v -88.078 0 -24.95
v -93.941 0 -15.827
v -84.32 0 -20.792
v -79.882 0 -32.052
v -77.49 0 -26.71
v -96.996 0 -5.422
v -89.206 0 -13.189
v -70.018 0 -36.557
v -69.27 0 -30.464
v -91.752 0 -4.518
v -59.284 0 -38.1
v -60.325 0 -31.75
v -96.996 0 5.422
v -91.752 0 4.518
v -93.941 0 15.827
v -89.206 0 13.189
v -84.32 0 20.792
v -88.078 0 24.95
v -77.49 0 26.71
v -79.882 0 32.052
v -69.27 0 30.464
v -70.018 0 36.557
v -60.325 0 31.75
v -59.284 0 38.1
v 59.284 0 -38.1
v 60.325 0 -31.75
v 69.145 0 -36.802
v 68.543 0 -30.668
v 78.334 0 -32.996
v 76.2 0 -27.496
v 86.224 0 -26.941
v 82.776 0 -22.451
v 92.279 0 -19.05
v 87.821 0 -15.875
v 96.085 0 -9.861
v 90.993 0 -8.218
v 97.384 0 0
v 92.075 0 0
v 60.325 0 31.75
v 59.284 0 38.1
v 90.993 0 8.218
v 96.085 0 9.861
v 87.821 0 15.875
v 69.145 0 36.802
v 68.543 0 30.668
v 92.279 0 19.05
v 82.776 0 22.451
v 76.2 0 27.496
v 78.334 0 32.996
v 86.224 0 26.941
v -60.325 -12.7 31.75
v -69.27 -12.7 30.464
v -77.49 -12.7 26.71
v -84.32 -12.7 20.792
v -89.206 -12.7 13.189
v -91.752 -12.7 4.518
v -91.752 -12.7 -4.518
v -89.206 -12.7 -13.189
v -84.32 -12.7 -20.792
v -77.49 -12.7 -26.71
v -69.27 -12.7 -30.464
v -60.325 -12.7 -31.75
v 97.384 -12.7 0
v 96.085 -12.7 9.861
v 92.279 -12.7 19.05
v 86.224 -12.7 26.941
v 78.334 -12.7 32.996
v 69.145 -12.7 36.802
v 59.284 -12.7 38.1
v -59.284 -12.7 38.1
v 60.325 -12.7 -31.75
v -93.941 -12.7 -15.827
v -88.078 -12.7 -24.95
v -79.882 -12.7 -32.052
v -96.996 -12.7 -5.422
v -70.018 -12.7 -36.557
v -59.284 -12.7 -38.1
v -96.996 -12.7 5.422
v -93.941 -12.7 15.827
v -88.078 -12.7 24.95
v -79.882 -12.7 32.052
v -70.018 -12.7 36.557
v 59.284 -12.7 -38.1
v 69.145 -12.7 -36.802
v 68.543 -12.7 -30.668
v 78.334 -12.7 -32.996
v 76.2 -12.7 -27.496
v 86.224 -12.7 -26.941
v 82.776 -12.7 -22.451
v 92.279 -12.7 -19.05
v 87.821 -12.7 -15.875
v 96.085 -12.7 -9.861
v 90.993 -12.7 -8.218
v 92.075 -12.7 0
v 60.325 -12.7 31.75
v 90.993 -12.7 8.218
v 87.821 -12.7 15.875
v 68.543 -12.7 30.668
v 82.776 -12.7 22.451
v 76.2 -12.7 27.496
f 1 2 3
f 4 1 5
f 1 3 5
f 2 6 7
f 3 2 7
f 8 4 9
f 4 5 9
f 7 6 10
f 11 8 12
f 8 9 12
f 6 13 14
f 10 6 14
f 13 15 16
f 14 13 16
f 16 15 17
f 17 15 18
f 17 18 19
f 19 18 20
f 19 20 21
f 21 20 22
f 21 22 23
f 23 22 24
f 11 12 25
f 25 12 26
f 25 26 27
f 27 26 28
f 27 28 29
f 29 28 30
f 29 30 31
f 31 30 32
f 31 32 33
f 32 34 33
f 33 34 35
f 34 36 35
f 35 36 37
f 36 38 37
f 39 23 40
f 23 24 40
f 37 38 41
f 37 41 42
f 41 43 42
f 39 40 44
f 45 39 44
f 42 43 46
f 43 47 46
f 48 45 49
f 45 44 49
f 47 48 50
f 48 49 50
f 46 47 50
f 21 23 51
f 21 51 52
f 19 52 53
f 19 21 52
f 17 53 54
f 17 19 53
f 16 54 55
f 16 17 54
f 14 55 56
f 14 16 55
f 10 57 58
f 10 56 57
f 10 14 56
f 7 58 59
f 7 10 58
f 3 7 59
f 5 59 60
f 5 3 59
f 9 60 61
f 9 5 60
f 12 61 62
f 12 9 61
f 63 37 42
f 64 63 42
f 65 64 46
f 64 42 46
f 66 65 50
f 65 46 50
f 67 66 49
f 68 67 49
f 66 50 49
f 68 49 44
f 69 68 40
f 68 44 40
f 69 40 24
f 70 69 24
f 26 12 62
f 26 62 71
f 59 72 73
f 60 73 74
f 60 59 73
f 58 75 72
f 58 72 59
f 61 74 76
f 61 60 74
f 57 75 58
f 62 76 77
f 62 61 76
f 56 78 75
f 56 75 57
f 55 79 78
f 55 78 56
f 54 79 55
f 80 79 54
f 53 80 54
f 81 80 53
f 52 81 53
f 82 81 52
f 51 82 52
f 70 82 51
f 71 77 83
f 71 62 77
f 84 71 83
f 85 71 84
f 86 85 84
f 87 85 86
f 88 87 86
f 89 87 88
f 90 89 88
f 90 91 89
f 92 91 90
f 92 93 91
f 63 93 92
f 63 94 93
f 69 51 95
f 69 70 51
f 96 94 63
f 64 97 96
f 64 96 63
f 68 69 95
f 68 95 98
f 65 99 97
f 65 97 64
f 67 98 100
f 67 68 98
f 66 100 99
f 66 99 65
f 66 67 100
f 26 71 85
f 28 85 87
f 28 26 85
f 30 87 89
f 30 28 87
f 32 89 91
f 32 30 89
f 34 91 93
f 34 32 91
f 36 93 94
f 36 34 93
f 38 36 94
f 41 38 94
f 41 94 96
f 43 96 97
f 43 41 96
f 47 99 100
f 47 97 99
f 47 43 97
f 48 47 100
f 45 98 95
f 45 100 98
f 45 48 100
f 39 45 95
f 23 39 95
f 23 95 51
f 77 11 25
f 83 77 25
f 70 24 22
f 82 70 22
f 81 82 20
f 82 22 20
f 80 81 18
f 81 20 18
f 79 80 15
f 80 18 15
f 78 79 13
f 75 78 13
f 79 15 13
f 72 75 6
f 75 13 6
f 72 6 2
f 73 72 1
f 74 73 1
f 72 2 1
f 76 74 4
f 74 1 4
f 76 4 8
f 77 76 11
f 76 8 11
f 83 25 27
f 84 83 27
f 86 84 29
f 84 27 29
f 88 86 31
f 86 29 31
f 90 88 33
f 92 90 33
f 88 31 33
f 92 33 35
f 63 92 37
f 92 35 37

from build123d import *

# Parameters (mm, degrees)
F1_DEPTH = 12.7
F3_DEPTH = 25.4


with BuildPart() as f1:
    # F0 (on Front) → F1 (new body)
    with BuildSketch(Plane.XZ):
        with BuildLine():
            Line((-59.2836, 0), (-59.2836, 38.1))
            ThreePointArc((-59.2836, 38.1), (-97.3836, 0), (-59.2836, -38.1))
            Line((-59.2836, -38.1), (-59.2836, 0))
        make_face()
        with BuildLine():
            ThreePointArc((-21.1836, 0), (-32.342832, 26.940768), (-59.2836, 38.1))
            Line((-59.2836, 38.1), (-59.2836, 0))
            Line((-59.2836, 0), (-59.2836, -38.1))
            ThreePointArc((-59.2836, -38.1), (-32.342832, -26.940768), (-21.1836, 0))
        make_face()
        with BuildLine():
            Line((59.2836, 38.1), (-59.2836, 38.1))
            ThreePointArc((-59.2836, 38.1), (-32.342832, 26.940768), (-21.1836, 0))
            ThreePointArc((-21.1836, 0), (-32.342832, -26.940768), (-59.2836, -38.1))
            Line((-59.2836, -38.1), (59.2836, -38.1))
            ThreePointArc((59.2836, -38.1), (21.1836, 0), (59.2836, 38.1))
        make_face()
        with BuildLine():
            Line((59.2836, 0), (59.2836, 38.1))
            ThreePointArc((59.2836, 38.1), (21.1836, 0), (59.2836, -38.1))
            Line((59.2836, -38.1), (59.2836, 0))
        make_face()
        with BuildLine():
            ThreePointArc((97.3836, 0), (86.224368, 26.940768), (59.2836, 38.1))
            Line((59.2836, 38.1), (59.2836, 0))
            Line((59.2836, 0), (59.2836, -38.1))
            ThreePointArc((59.2836, -38.1), (86.224368, -26.940768), (97.3836, 0))
        make_face()
    extrude(amount=F1_DEPTH)

    # F2 (on Front) → F3 (cut)
    with BuildSketch(Plane.XZ):
        with BuildLine():
            Line((-60.325, 0), (-60.325, 31.75))
            ThreePointArc((-60.325, 31.75), (-92.075, 0), (-60.325, -31.75))
            Line((-60.325, -31.75), (-60.325, 0))
        make_face()
        with BuildLine():
            ThreePointArc((-28.575, 0), (-37.87436, 22.45064), (-60.325, 31.75))
            Line((-60.325, 31.75), (-60.325, 0))
            Line((-60.325, 0), (-60.325, -31.75))
            ThreePointArc((-60.325, -31.75), (-37.87436, -22.45064), (-28.575, 0))
        make_face()
        with BuildLine():
            ThreePointArc((60.325, -31.75), (28.575, 0), (60.325, 31.75))
            Line((60.325, 31.75), (-60.325, 31.75))
            ThreePointArc((-60.325, 31.75), (-37.87436, 22.45064), (-28.575, 0))
            ThreePointArc((-28.575, 0), (-37.87436, -22.45064), (-60.325, -31.75))
            Line((-60.325, -31.75), (60.325, -31.75))
        make_face()
        with BuildLine():
            Line((60.325, 0), (60.325, 31.75))
            ThreePointArc((60.325, 31.75), (28.575, 0), (60.325, -31.75))
            Line((60.325, -31.75), (60.325, 0))
        make_face()
        with BuildLine():
            ThreePointArc((92.075, 0), (82.77564, 22.45064), (60.325, 31.75))
            Line((60.325, 31.75), (60.325, 0))
            Line((60.325, 0), (60.325, -31.75))
            ThreePointArc((60.325, -31.75), (82.77564, -22.45064), (92.075, 0))
        make_face()
    extrude(amount=F3_DEPTH, mode=Mode.SUBTRACT)


solid = f1.part
